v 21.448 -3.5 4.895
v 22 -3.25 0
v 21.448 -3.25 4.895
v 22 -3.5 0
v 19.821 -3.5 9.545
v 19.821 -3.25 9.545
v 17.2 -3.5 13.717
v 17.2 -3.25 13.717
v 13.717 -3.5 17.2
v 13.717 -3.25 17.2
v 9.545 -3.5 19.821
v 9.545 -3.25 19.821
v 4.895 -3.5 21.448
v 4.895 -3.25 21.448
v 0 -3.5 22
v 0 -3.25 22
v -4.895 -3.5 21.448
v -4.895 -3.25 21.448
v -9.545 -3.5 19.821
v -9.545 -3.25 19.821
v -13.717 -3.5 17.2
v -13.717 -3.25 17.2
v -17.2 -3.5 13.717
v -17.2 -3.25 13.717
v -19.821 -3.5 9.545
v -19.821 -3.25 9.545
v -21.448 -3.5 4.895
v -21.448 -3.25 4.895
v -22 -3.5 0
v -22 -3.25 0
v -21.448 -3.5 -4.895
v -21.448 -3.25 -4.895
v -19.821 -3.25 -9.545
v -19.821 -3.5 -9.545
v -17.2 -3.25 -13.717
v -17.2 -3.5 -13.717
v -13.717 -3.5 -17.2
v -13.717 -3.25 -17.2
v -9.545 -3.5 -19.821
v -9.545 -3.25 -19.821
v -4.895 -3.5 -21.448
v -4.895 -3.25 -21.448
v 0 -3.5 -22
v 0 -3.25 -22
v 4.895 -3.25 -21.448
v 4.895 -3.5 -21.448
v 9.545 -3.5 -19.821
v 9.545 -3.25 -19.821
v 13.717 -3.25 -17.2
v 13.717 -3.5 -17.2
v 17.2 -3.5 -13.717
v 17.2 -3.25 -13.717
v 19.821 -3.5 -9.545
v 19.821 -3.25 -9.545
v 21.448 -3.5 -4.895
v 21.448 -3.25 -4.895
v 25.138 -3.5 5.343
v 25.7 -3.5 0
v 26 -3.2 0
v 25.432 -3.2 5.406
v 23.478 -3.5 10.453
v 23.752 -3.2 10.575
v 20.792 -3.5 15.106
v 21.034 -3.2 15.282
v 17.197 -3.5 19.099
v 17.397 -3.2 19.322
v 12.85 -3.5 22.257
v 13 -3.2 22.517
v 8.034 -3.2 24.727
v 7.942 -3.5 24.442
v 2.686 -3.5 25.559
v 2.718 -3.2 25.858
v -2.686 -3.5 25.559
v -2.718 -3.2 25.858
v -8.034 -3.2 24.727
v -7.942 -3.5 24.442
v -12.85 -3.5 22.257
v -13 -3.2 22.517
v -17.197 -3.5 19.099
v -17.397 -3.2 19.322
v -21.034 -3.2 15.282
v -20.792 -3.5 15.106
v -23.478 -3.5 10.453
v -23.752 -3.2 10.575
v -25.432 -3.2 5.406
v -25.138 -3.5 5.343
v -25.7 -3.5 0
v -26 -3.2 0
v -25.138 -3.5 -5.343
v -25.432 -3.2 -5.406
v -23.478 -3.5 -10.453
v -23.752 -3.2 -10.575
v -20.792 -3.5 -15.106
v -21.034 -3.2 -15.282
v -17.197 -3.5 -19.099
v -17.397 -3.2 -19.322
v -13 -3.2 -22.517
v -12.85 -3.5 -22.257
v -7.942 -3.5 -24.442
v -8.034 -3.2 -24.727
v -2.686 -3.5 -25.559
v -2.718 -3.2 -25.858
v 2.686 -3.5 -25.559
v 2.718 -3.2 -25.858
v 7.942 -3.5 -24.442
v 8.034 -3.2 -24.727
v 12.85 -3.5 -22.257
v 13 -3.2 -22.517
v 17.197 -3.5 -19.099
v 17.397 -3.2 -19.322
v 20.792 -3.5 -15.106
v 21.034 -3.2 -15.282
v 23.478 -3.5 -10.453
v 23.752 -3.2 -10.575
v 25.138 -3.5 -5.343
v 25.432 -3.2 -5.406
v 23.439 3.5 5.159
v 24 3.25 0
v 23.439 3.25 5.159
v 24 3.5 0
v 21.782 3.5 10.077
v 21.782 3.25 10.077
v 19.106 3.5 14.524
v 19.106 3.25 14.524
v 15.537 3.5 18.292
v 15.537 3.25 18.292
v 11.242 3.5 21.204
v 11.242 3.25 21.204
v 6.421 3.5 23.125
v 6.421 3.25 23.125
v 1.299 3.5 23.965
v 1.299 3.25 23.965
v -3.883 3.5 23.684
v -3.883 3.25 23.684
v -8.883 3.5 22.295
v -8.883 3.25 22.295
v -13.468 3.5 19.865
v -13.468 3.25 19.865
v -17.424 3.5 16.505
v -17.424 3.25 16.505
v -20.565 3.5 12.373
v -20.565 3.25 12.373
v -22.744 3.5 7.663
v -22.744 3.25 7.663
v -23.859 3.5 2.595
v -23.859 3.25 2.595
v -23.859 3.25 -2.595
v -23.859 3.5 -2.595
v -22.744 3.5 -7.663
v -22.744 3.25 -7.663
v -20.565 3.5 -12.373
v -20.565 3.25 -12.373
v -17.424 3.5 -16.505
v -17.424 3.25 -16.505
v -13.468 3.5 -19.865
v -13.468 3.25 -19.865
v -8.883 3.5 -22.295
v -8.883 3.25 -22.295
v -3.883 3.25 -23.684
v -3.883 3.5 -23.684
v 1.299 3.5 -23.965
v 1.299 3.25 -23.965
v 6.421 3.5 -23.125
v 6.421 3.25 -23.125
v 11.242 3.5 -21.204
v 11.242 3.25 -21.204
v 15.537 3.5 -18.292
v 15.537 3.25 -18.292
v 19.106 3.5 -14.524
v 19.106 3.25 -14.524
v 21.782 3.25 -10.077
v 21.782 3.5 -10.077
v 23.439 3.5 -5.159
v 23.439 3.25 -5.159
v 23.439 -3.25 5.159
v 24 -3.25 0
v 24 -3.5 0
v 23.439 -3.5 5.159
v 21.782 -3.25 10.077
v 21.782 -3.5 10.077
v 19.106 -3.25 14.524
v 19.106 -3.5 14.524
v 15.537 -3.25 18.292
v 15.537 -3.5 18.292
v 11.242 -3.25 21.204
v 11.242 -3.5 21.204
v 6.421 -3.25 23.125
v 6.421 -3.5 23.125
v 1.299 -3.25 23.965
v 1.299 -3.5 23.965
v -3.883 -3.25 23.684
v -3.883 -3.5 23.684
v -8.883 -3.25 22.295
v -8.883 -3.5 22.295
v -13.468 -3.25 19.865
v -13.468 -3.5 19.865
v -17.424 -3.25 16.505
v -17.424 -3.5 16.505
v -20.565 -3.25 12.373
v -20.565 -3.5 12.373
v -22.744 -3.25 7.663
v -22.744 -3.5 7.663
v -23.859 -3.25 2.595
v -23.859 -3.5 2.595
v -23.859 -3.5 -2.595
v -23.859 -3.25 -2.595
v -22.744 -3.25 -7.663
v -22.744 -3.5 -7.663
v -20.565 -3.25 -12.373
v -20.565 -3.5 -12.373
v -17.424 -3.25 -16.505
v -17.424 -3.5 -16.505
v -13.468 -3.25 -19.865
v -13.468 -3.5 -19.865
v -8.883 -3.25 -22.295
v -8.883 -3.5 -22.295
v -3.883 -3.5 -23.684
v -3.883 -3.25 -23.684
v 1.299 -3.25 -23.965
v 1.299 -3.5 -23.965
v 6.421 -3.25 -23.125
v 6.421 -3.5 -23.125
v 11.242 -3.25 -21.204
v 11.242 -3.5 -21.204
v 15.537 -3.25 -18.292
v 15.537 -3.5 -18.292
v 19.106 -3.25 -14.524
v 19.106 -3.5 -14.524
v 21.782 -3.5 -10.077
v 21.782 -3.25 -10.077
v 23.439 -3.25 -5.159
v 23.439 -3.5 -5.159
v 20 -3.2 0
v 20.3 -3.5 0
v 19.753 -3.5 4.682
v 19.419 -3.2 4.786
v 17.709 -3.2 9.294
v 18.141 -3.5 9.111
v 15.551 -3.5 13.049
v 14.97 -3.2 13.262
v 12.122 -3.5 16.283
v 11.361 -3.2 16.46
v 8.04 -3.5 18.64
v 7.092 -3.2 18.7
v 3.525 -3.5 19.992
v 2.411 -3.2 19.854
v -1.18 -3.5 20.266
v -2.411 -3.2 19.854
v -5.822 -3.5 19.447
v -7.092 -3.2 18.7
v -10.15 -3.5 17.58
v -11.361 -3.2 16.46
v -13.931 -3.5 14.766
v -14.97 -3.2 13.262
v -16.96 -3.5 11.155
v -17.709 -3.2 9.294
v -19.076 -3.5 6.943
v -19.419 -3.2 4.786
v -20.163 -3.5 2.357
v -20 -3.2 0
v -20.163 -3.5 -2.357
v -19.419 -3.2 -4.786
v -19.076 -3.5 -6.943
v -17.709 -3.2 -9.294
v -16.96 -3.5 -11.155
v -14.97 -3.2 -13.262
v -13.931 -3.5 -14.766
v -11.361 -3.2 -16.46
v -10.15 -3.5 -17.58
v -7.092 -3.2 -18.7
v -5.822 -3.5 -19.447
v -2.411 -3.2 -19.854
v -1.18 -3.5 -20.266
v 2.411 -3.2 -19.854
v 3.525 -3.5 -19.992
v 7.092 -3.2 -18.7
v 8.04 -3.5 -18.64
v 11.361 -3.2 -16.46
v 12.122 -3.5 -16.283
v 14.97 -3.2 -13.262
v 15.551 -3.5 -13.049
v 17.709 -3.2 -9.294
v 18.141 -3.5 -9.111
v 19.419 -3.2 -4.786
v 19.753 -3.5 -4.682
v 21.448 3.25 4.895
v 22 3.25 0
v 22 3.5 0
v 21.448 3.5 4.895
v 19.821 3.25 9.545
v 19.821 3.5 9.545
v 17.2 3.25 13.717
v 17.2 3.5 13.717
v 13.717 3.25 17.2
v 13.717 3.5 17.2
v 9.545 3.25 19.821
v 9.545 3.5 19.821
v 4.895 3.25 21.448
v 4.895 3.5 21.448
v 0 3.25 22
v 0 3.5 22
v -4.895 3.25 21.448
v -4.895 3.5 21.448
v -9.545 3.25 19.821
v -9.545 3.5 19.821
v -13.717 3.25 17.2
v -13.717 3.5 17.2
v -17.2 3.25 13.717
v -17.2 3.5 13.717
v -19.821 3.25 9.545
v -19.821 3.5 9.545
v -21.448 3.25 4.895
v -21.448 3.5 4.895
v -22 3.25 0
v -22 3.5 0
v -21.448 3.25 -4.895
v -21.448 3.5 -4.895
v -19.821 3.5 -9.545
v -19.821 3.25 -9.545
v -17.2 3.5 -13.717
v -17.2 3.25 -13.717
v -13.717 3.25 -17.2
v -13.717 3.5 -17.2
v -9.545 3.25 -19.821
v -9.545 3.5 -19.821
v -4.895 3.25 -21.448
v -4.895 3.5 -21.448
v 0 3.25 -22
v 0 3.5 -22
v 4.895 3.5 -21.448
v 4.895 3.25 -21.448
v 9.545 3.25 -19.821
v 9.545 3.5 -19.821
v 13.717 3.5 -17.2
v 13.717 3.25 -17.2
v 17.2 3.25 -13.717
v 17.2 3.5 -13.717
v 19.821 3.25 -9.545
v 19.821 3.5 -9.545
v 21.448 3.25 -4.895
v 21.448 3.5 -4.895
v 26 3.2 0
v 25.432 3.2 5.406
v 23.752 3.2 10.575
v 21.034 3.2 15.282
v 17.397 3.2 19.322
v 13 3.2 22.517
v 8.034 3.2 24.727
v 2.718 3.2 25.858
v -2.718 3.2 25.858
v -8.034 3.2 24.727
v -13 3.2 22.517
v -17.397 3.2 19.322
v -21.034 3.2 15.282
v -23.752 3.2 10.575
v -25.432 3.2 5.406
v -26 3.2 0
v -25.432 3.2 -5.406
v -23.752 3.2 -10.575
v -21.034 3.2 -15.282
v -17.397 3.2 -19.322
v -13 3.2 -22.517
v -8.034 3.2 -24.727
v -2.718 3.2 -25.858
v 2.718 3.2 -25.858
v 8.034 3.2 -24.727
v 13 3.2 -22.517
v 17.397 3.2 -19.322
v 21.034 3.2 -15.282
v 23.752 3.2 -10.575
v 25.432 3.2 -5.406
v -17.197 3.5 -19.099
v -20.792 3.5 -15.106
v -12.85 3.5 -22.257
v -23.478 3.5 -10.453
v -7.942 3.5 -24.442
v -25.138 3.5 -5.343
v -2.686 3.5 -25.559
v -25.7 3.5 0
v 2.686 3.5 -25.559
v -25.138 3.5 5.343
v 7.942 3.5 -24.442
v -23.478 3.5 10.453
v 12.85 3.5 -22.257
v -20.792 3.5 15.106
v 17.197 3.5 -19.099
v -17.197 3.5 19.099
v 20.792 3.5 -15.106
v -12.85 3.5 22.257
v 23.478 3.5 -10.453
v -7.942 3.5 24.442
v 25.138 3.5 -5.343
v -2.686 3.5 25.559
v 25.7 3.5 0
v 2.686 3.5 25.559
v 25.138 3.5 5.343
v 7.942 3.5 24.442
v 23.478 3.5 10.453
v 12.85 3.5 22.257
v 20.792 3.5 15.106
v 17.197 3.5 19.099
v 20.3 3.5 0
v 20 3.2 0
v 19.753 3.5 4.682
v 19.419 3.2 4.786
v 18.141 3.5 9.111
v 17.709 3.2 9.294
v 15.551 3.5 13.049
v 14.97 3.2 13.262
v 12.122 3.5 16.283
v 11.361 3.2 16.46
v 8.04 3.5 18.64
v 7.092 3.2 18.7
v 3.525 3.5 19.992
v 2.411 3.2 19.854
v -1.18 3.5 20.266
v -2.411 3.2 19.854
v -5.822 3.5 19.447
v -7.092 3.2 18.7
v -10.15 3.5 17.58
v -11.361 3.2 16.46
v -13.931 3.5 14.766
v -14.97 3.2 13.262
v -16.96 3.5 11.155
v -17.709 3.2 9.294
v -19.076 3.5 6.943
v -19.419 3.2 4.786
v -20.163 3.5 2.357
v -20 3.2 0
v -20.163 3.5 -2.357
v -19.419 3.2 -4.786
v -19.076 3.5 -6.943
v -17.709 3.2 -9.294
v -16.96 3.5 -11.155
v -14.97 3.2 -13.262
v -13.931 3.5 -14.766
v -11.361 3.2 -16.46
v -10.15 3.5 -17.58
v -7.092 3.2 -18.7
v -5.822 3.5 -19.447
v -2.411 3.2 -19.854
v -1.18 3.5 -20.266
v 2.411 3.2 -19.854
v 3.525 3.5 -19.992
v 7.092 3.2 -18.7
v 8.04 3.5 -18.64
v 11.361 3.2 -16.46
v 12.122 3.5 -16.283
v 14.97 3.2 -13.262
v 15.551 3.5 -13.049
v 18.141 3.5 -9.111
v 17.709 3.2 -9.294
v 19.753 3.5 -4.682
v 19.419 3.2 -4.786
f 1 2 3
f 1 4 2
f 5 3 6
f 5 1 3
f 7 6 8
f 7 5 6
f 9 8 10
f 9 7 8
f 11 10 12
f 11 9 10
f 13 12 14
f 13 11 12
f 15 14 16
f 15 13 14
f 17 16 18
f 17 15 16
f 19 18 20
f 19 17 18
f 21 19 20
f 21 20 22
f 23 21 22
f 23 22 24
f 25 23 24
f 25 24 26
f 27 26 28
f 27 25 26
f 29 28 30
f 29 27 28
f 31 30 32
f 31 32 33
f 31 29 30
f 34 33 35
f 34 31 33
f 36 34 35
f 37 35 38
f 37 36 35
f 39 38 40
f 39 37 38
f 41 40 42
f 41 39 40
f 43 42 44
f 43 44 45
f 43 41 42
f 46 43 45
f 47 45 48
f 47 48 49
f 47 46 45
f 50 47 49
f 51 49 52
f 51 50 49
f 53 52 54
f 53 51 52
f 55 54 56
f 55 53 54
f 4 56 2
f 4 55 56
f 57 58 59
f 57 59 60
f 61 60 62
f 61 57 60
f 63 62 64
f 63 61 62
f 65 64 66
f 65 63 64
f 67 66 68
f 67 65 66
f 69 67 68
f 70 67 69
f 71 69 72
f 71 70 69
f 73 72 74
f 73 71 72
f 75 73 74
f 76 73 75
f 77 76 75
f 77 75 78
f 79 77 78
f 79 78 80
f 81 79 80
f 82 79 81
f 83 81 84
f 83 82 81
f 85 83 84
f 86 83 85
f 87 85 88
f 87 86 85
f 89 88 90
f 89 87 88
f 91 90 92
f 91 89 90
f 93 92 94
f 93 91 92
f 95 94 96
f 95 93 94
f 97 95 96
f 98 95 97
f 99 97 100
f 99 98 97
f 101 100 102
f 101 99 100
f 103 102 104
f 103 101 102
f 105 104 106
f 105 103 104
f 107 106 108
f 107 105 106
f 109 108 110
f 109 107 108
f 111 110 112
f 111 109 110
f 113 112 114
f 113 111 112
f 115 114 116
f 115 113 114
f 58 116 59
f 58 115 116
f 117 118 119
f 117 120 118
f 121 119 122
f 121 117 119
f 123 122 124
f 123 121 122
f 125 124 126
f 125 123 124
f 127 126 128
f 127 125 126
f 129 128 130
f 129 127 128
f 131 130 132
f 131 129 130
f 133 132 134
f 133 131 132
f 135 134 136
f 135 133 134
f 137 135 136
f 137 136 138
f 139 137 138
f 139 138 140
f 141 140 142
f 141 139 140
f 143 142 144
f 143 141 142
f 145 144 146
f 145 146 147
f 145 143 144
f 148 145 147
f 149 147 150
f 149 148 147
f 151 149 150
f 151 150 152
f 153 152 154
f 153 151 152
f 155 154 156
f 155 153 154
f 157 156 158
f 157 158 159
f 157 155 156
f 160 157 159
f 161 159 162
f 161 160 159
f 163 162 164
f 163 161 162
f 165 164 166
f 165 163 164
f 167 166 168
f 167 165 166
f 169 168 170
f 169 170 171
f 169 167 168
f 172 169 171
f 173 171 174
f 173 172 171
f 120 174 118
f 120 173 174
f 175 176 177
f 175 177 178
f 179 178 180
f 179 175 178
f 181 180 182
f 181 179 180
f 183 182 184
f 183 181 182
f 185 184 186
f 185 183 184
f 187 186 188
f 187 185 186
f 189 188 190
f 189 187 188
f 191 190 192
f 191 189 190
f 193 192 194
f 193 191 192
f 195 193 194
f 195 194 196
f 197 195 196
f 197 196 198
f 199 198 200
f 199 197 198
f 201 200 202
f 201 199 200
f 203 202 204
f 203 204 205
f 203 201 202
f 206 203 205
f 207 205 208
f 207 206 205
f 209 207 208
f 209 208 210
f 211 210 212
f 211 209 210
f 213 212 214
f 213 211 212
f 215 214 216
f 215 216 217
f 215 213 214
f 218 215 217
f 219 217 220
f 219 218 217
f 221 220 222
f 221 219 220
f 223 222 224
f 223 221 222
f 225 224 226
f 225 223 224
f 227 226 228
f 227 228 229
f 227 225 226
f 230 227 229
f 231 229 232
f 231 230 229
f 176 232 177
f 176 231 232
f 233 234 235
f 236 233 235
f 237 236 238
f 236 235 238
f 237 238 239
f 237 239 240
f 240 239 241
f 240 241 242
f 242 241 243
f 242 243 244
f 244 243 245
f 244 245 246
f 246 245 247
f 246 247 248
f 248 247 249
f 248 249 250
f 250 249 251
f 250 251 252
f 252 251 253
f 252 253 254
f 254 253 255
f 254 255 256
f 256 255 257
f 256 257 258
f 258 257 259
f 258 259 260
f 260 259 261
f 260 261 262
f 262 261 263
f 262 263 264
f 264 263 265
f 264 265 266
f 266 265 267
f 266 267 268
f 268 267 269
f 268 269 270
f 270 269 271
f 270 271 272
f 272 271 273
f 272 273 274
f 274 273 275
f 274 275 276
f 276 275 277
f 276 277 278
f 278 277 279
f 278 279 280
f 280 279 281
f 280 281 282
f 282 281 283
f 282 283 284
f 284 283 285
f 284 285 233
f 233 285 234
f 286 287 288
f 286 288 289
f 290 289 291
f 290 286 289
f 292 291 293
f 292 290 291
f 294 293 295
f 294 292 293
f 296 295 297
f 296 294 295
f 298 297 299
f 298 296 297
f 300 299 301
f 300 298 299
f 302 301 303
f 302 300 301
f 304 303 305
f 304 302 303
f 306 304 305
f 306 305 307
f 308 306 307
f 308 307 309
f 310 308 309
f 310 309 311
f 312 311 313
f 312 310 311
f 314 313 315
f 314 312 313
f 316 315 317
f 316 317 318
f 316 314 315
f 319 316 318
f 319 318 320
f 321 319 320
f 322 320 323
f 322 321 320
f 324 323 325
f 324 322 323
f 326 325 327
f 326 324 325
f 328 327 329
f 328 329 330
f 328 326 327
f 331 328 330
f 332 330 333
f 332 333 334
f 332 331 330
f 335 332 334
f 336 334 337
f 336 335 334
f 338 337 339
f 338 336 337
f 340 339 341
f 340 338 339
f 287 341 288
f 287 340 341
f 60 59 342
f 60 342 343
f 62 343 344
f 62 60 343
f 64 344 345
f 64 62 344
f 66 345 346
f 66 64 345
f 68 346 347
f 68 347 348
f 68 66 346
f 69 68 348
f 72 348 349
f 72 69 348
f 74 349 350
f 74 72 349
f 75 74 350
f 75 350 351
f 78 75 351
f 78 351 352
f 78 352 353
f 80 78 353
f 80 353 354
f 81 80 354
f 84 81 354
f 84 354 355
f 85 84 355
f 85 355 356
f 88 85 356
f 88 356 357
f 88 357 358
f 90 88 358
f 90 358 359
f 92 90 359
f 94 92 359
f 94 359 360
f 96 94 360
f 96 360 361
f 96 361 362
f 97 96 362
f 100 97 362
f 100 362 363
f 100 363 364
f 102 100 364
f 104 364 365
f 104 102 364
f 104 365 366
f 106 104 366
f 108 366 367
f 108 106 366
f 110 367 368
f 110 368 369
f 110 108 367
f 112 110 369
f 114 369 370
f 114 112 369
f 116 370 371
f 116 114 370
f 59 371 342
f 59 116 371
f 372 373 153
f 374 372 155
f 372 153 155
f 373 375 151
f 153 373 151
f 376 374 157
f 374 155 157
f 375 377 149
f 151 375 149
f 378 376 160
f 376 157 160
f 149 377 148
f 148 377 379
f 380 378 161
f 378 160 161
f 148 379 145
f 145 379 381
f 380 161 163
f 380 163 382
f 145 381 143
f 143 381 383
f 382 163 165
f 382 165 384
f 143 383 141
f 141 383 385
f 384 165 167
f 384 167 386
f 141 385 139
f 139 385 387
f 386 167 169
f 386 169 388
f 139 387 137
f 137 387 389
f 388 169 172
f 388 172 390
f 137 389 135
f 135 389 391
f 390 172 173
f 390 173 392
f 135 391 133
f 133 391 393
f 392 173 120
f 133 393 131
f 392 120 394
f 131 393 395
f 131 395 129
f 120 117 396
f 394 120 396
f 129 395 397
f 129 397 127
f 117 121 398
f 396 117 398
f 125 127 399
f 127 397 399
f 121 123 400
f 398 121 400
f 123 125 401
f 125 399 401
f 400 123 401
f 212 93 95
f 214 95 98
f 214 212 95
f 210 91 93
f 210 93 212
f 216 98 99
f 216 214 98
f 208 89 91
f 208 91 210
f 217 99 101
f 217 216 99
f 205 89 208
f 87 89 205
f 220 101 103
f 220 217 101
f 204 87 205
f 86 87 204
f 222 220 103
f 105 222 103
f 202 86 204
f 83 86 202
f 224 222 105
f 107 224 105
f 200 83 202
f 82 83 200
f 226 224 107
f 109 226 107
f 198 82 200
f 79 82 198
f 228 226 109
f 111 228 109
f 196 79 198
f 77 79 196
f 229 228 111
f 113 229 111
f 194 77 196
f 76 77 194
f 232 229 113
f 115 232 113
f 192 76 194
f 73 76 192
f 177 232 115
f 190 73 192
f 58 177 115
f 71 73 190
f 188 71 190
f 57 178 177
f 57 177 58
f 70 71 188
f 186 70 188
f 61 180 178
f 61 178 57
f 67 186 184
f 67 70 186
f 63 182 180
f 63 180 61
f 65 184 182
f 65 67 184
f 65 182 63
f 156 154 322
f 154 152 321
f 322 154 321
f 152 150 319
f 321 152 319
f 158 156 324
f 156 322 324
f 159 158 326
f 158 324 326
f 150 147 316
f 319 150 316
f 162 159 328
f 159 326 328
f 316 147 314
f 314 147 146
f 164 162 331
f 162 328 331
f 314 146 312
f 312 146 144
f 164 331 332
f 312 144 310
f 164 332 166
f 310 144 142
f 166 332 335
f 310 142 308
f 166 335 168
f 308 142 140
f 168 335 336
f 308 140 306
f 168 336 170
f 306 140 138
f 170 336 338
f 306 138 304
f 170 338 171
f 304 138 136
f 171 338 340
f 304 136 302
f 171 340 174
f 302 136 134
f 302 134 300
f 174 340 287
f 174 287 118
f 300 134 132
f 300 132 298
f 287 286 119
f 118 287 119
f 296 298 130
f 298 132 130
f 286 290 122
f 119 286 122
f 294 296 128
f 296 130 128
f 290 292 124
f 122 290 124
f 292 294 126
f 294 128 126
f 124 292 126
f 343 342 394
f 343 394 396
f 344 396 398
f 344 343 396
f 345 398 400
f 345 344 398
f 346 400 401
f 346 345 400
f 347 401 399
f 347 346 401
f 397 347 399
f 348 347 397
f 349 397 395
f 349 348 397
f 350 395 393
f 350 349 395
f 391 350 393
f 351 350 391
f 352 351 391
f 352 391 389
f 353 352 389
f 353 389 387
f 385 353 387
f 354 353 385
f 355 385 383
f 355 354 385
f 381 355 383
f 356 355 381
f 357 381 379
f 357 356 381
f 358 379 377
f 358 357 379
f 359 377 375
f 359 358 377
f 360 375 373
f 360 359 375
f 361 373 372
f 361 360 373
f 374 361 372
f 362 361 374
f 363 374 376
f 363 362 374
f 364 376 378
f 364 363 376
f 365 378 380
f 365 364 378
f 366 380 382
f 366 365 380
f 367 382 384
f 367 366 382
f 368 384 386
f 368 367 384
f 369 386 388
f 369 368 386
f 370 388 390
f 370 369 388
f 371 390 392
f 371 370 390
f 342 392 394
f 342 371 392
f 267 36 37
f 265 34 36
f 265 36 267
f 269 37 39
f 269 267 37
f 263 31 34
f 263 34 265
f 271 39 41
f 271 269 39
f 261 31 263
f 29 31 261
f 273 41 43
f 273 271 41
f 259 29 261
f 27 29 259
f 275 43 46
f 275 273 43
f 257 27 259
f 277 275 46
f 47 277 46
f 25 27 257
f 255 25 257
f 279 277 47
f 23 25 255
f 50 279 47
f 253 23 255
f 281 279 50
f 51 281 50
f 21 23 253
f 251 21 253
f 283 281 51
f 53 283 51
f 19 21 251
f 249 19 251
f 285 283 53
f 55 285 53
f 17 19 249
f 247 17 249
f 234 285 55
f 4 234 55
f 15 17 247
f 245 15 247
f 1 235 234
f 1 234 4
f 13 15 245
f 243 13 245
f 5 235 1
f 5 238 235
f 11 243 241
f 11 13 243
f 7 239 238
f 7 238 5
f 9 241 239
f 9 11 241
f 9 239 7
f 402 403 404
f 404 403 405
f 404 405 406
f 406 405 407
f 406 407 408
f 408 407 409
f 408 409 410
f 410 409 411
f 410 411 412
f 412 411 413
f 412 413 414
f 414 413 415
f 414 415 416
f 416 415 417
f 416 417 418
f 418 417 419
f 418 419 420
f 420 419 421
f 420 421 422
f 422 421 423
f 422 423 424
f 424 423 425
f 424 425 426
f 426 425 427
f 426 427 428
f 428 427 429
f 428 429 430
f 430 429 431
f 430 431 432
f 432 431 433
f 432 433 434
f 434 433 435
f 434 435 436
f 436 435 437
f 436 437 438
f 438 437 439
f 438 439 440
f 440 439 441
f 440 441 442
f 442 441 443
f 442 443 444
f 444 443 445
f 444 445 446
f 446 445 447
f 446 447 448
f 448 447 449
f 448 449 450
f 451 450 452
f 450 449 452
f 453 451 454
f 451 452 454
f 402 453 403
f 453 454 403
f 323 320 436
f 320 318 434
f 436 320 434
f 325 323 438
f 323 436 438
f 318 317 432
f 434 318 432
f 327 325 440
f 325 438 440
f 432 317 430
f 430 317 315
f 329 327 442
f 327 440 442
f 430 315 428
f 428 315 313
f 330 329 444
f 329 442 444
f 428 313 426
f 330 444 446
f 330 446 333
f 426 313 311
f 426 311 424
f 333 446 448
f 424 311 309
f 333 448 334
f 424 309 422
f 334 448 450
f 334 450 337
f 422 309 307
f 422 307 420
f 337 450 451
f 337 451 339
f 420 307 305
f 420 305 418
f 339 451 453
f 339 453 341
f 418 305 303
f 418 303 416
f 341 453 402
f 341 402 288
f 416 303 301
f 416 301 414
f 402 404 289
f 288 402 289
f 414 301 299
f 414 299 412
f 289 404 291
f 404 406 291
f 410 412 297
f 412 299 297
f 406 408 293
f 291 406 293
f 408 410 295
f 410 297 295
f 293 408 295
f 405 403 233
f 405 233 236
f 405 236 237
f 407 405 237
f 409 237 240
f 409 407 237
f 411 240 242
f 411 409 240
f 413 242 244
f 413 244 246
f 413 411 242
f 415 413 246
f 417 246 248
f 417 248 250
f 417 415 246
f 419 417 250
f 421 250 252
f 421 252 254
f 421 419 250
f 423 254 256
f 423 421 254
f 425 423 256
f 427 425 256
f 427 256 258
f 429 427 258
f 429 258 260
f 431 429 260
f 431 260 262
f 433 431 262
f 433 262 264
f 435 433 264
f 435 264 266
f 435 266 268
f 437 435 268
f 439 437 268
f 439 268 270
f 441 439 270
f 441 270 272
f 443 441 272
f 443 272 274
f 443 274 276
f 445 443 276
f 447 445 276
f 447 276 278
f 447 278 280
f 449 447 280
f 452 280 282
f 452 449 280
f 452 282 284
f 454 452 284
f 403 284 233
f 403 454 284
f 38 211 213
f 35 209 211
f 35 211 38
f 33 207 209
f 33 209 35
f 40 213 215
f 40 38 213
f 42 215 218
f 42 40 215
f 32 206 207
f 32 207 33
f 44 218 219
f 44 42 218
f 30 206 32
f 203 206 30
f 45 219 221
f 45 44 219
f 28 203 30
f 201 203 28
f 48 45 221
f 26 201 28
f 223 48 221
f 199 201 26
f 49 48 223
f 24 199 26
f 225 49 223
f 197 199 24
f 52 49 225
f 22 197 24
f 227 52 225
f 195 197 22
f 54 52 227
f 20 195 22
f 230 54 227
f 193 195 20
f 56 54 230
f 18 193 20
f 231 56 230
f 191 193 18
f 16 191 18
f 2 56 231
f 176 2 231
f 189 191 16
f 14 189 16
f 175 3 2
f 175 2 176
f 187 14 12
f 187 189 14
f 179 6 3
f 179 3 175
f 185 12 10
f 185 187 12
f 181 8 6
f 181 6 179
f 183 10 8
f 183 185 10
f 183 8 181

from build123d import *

# Parameters (mm, degrees)
F0_R     = 26
F0_R_2   = 24
F1_DEPTH = 3.5
F0_R_3   = 22
F0_R_4   = 20
F2_DEPTH = 3.25
F3_SIZE  = 0.3


with BuildPart() as f1:
    # F0 (on Front) → F1 (new body, symmetric)
    with BuildSketch(Plane.XZ):
        Circle(F0_R)
        Circle(F0_R_2, mode=Mode.SUBTRACT)
    extrude(amount=F1_DEPTH, both=True)



with BuildPart() as f1b:
    # F0 (on Front) → F1, piece 2 (new body, symmetric)
    with BuildSketch(Plane.XZ):
        Circle(F0_R_3)
        Circle(F0_R_4, mode=Mode.SUBTRACT)
    extrude(amount=F1_DEPTH, both=True)


with BuildPart() as f1_1:
    add(f1.part)

    add(f1b.part)  # F2 merges F1b
    # F0 (on Front) → F2 (join, symmetric)
    with BuildSketch(Plane.XZ):
        Circle(F0_R_2)
        Circle(F0_R_3, mode=Mode.SUBTRACT)
    extrude(amount=F2_DEPTH, both=True)

    # F3
    f3_edges = [f1_1.edges().sort_by_distance(p)[0] for p in [
        (-26, -3.5, 0),
        (-26, 3.5, 0),
        (-20, -3.5, 0),
        (-20, 3.5, 0),
    ]]
    chamfer(f3_edges, length=F3_SIZE)


solid = f1_1.part
